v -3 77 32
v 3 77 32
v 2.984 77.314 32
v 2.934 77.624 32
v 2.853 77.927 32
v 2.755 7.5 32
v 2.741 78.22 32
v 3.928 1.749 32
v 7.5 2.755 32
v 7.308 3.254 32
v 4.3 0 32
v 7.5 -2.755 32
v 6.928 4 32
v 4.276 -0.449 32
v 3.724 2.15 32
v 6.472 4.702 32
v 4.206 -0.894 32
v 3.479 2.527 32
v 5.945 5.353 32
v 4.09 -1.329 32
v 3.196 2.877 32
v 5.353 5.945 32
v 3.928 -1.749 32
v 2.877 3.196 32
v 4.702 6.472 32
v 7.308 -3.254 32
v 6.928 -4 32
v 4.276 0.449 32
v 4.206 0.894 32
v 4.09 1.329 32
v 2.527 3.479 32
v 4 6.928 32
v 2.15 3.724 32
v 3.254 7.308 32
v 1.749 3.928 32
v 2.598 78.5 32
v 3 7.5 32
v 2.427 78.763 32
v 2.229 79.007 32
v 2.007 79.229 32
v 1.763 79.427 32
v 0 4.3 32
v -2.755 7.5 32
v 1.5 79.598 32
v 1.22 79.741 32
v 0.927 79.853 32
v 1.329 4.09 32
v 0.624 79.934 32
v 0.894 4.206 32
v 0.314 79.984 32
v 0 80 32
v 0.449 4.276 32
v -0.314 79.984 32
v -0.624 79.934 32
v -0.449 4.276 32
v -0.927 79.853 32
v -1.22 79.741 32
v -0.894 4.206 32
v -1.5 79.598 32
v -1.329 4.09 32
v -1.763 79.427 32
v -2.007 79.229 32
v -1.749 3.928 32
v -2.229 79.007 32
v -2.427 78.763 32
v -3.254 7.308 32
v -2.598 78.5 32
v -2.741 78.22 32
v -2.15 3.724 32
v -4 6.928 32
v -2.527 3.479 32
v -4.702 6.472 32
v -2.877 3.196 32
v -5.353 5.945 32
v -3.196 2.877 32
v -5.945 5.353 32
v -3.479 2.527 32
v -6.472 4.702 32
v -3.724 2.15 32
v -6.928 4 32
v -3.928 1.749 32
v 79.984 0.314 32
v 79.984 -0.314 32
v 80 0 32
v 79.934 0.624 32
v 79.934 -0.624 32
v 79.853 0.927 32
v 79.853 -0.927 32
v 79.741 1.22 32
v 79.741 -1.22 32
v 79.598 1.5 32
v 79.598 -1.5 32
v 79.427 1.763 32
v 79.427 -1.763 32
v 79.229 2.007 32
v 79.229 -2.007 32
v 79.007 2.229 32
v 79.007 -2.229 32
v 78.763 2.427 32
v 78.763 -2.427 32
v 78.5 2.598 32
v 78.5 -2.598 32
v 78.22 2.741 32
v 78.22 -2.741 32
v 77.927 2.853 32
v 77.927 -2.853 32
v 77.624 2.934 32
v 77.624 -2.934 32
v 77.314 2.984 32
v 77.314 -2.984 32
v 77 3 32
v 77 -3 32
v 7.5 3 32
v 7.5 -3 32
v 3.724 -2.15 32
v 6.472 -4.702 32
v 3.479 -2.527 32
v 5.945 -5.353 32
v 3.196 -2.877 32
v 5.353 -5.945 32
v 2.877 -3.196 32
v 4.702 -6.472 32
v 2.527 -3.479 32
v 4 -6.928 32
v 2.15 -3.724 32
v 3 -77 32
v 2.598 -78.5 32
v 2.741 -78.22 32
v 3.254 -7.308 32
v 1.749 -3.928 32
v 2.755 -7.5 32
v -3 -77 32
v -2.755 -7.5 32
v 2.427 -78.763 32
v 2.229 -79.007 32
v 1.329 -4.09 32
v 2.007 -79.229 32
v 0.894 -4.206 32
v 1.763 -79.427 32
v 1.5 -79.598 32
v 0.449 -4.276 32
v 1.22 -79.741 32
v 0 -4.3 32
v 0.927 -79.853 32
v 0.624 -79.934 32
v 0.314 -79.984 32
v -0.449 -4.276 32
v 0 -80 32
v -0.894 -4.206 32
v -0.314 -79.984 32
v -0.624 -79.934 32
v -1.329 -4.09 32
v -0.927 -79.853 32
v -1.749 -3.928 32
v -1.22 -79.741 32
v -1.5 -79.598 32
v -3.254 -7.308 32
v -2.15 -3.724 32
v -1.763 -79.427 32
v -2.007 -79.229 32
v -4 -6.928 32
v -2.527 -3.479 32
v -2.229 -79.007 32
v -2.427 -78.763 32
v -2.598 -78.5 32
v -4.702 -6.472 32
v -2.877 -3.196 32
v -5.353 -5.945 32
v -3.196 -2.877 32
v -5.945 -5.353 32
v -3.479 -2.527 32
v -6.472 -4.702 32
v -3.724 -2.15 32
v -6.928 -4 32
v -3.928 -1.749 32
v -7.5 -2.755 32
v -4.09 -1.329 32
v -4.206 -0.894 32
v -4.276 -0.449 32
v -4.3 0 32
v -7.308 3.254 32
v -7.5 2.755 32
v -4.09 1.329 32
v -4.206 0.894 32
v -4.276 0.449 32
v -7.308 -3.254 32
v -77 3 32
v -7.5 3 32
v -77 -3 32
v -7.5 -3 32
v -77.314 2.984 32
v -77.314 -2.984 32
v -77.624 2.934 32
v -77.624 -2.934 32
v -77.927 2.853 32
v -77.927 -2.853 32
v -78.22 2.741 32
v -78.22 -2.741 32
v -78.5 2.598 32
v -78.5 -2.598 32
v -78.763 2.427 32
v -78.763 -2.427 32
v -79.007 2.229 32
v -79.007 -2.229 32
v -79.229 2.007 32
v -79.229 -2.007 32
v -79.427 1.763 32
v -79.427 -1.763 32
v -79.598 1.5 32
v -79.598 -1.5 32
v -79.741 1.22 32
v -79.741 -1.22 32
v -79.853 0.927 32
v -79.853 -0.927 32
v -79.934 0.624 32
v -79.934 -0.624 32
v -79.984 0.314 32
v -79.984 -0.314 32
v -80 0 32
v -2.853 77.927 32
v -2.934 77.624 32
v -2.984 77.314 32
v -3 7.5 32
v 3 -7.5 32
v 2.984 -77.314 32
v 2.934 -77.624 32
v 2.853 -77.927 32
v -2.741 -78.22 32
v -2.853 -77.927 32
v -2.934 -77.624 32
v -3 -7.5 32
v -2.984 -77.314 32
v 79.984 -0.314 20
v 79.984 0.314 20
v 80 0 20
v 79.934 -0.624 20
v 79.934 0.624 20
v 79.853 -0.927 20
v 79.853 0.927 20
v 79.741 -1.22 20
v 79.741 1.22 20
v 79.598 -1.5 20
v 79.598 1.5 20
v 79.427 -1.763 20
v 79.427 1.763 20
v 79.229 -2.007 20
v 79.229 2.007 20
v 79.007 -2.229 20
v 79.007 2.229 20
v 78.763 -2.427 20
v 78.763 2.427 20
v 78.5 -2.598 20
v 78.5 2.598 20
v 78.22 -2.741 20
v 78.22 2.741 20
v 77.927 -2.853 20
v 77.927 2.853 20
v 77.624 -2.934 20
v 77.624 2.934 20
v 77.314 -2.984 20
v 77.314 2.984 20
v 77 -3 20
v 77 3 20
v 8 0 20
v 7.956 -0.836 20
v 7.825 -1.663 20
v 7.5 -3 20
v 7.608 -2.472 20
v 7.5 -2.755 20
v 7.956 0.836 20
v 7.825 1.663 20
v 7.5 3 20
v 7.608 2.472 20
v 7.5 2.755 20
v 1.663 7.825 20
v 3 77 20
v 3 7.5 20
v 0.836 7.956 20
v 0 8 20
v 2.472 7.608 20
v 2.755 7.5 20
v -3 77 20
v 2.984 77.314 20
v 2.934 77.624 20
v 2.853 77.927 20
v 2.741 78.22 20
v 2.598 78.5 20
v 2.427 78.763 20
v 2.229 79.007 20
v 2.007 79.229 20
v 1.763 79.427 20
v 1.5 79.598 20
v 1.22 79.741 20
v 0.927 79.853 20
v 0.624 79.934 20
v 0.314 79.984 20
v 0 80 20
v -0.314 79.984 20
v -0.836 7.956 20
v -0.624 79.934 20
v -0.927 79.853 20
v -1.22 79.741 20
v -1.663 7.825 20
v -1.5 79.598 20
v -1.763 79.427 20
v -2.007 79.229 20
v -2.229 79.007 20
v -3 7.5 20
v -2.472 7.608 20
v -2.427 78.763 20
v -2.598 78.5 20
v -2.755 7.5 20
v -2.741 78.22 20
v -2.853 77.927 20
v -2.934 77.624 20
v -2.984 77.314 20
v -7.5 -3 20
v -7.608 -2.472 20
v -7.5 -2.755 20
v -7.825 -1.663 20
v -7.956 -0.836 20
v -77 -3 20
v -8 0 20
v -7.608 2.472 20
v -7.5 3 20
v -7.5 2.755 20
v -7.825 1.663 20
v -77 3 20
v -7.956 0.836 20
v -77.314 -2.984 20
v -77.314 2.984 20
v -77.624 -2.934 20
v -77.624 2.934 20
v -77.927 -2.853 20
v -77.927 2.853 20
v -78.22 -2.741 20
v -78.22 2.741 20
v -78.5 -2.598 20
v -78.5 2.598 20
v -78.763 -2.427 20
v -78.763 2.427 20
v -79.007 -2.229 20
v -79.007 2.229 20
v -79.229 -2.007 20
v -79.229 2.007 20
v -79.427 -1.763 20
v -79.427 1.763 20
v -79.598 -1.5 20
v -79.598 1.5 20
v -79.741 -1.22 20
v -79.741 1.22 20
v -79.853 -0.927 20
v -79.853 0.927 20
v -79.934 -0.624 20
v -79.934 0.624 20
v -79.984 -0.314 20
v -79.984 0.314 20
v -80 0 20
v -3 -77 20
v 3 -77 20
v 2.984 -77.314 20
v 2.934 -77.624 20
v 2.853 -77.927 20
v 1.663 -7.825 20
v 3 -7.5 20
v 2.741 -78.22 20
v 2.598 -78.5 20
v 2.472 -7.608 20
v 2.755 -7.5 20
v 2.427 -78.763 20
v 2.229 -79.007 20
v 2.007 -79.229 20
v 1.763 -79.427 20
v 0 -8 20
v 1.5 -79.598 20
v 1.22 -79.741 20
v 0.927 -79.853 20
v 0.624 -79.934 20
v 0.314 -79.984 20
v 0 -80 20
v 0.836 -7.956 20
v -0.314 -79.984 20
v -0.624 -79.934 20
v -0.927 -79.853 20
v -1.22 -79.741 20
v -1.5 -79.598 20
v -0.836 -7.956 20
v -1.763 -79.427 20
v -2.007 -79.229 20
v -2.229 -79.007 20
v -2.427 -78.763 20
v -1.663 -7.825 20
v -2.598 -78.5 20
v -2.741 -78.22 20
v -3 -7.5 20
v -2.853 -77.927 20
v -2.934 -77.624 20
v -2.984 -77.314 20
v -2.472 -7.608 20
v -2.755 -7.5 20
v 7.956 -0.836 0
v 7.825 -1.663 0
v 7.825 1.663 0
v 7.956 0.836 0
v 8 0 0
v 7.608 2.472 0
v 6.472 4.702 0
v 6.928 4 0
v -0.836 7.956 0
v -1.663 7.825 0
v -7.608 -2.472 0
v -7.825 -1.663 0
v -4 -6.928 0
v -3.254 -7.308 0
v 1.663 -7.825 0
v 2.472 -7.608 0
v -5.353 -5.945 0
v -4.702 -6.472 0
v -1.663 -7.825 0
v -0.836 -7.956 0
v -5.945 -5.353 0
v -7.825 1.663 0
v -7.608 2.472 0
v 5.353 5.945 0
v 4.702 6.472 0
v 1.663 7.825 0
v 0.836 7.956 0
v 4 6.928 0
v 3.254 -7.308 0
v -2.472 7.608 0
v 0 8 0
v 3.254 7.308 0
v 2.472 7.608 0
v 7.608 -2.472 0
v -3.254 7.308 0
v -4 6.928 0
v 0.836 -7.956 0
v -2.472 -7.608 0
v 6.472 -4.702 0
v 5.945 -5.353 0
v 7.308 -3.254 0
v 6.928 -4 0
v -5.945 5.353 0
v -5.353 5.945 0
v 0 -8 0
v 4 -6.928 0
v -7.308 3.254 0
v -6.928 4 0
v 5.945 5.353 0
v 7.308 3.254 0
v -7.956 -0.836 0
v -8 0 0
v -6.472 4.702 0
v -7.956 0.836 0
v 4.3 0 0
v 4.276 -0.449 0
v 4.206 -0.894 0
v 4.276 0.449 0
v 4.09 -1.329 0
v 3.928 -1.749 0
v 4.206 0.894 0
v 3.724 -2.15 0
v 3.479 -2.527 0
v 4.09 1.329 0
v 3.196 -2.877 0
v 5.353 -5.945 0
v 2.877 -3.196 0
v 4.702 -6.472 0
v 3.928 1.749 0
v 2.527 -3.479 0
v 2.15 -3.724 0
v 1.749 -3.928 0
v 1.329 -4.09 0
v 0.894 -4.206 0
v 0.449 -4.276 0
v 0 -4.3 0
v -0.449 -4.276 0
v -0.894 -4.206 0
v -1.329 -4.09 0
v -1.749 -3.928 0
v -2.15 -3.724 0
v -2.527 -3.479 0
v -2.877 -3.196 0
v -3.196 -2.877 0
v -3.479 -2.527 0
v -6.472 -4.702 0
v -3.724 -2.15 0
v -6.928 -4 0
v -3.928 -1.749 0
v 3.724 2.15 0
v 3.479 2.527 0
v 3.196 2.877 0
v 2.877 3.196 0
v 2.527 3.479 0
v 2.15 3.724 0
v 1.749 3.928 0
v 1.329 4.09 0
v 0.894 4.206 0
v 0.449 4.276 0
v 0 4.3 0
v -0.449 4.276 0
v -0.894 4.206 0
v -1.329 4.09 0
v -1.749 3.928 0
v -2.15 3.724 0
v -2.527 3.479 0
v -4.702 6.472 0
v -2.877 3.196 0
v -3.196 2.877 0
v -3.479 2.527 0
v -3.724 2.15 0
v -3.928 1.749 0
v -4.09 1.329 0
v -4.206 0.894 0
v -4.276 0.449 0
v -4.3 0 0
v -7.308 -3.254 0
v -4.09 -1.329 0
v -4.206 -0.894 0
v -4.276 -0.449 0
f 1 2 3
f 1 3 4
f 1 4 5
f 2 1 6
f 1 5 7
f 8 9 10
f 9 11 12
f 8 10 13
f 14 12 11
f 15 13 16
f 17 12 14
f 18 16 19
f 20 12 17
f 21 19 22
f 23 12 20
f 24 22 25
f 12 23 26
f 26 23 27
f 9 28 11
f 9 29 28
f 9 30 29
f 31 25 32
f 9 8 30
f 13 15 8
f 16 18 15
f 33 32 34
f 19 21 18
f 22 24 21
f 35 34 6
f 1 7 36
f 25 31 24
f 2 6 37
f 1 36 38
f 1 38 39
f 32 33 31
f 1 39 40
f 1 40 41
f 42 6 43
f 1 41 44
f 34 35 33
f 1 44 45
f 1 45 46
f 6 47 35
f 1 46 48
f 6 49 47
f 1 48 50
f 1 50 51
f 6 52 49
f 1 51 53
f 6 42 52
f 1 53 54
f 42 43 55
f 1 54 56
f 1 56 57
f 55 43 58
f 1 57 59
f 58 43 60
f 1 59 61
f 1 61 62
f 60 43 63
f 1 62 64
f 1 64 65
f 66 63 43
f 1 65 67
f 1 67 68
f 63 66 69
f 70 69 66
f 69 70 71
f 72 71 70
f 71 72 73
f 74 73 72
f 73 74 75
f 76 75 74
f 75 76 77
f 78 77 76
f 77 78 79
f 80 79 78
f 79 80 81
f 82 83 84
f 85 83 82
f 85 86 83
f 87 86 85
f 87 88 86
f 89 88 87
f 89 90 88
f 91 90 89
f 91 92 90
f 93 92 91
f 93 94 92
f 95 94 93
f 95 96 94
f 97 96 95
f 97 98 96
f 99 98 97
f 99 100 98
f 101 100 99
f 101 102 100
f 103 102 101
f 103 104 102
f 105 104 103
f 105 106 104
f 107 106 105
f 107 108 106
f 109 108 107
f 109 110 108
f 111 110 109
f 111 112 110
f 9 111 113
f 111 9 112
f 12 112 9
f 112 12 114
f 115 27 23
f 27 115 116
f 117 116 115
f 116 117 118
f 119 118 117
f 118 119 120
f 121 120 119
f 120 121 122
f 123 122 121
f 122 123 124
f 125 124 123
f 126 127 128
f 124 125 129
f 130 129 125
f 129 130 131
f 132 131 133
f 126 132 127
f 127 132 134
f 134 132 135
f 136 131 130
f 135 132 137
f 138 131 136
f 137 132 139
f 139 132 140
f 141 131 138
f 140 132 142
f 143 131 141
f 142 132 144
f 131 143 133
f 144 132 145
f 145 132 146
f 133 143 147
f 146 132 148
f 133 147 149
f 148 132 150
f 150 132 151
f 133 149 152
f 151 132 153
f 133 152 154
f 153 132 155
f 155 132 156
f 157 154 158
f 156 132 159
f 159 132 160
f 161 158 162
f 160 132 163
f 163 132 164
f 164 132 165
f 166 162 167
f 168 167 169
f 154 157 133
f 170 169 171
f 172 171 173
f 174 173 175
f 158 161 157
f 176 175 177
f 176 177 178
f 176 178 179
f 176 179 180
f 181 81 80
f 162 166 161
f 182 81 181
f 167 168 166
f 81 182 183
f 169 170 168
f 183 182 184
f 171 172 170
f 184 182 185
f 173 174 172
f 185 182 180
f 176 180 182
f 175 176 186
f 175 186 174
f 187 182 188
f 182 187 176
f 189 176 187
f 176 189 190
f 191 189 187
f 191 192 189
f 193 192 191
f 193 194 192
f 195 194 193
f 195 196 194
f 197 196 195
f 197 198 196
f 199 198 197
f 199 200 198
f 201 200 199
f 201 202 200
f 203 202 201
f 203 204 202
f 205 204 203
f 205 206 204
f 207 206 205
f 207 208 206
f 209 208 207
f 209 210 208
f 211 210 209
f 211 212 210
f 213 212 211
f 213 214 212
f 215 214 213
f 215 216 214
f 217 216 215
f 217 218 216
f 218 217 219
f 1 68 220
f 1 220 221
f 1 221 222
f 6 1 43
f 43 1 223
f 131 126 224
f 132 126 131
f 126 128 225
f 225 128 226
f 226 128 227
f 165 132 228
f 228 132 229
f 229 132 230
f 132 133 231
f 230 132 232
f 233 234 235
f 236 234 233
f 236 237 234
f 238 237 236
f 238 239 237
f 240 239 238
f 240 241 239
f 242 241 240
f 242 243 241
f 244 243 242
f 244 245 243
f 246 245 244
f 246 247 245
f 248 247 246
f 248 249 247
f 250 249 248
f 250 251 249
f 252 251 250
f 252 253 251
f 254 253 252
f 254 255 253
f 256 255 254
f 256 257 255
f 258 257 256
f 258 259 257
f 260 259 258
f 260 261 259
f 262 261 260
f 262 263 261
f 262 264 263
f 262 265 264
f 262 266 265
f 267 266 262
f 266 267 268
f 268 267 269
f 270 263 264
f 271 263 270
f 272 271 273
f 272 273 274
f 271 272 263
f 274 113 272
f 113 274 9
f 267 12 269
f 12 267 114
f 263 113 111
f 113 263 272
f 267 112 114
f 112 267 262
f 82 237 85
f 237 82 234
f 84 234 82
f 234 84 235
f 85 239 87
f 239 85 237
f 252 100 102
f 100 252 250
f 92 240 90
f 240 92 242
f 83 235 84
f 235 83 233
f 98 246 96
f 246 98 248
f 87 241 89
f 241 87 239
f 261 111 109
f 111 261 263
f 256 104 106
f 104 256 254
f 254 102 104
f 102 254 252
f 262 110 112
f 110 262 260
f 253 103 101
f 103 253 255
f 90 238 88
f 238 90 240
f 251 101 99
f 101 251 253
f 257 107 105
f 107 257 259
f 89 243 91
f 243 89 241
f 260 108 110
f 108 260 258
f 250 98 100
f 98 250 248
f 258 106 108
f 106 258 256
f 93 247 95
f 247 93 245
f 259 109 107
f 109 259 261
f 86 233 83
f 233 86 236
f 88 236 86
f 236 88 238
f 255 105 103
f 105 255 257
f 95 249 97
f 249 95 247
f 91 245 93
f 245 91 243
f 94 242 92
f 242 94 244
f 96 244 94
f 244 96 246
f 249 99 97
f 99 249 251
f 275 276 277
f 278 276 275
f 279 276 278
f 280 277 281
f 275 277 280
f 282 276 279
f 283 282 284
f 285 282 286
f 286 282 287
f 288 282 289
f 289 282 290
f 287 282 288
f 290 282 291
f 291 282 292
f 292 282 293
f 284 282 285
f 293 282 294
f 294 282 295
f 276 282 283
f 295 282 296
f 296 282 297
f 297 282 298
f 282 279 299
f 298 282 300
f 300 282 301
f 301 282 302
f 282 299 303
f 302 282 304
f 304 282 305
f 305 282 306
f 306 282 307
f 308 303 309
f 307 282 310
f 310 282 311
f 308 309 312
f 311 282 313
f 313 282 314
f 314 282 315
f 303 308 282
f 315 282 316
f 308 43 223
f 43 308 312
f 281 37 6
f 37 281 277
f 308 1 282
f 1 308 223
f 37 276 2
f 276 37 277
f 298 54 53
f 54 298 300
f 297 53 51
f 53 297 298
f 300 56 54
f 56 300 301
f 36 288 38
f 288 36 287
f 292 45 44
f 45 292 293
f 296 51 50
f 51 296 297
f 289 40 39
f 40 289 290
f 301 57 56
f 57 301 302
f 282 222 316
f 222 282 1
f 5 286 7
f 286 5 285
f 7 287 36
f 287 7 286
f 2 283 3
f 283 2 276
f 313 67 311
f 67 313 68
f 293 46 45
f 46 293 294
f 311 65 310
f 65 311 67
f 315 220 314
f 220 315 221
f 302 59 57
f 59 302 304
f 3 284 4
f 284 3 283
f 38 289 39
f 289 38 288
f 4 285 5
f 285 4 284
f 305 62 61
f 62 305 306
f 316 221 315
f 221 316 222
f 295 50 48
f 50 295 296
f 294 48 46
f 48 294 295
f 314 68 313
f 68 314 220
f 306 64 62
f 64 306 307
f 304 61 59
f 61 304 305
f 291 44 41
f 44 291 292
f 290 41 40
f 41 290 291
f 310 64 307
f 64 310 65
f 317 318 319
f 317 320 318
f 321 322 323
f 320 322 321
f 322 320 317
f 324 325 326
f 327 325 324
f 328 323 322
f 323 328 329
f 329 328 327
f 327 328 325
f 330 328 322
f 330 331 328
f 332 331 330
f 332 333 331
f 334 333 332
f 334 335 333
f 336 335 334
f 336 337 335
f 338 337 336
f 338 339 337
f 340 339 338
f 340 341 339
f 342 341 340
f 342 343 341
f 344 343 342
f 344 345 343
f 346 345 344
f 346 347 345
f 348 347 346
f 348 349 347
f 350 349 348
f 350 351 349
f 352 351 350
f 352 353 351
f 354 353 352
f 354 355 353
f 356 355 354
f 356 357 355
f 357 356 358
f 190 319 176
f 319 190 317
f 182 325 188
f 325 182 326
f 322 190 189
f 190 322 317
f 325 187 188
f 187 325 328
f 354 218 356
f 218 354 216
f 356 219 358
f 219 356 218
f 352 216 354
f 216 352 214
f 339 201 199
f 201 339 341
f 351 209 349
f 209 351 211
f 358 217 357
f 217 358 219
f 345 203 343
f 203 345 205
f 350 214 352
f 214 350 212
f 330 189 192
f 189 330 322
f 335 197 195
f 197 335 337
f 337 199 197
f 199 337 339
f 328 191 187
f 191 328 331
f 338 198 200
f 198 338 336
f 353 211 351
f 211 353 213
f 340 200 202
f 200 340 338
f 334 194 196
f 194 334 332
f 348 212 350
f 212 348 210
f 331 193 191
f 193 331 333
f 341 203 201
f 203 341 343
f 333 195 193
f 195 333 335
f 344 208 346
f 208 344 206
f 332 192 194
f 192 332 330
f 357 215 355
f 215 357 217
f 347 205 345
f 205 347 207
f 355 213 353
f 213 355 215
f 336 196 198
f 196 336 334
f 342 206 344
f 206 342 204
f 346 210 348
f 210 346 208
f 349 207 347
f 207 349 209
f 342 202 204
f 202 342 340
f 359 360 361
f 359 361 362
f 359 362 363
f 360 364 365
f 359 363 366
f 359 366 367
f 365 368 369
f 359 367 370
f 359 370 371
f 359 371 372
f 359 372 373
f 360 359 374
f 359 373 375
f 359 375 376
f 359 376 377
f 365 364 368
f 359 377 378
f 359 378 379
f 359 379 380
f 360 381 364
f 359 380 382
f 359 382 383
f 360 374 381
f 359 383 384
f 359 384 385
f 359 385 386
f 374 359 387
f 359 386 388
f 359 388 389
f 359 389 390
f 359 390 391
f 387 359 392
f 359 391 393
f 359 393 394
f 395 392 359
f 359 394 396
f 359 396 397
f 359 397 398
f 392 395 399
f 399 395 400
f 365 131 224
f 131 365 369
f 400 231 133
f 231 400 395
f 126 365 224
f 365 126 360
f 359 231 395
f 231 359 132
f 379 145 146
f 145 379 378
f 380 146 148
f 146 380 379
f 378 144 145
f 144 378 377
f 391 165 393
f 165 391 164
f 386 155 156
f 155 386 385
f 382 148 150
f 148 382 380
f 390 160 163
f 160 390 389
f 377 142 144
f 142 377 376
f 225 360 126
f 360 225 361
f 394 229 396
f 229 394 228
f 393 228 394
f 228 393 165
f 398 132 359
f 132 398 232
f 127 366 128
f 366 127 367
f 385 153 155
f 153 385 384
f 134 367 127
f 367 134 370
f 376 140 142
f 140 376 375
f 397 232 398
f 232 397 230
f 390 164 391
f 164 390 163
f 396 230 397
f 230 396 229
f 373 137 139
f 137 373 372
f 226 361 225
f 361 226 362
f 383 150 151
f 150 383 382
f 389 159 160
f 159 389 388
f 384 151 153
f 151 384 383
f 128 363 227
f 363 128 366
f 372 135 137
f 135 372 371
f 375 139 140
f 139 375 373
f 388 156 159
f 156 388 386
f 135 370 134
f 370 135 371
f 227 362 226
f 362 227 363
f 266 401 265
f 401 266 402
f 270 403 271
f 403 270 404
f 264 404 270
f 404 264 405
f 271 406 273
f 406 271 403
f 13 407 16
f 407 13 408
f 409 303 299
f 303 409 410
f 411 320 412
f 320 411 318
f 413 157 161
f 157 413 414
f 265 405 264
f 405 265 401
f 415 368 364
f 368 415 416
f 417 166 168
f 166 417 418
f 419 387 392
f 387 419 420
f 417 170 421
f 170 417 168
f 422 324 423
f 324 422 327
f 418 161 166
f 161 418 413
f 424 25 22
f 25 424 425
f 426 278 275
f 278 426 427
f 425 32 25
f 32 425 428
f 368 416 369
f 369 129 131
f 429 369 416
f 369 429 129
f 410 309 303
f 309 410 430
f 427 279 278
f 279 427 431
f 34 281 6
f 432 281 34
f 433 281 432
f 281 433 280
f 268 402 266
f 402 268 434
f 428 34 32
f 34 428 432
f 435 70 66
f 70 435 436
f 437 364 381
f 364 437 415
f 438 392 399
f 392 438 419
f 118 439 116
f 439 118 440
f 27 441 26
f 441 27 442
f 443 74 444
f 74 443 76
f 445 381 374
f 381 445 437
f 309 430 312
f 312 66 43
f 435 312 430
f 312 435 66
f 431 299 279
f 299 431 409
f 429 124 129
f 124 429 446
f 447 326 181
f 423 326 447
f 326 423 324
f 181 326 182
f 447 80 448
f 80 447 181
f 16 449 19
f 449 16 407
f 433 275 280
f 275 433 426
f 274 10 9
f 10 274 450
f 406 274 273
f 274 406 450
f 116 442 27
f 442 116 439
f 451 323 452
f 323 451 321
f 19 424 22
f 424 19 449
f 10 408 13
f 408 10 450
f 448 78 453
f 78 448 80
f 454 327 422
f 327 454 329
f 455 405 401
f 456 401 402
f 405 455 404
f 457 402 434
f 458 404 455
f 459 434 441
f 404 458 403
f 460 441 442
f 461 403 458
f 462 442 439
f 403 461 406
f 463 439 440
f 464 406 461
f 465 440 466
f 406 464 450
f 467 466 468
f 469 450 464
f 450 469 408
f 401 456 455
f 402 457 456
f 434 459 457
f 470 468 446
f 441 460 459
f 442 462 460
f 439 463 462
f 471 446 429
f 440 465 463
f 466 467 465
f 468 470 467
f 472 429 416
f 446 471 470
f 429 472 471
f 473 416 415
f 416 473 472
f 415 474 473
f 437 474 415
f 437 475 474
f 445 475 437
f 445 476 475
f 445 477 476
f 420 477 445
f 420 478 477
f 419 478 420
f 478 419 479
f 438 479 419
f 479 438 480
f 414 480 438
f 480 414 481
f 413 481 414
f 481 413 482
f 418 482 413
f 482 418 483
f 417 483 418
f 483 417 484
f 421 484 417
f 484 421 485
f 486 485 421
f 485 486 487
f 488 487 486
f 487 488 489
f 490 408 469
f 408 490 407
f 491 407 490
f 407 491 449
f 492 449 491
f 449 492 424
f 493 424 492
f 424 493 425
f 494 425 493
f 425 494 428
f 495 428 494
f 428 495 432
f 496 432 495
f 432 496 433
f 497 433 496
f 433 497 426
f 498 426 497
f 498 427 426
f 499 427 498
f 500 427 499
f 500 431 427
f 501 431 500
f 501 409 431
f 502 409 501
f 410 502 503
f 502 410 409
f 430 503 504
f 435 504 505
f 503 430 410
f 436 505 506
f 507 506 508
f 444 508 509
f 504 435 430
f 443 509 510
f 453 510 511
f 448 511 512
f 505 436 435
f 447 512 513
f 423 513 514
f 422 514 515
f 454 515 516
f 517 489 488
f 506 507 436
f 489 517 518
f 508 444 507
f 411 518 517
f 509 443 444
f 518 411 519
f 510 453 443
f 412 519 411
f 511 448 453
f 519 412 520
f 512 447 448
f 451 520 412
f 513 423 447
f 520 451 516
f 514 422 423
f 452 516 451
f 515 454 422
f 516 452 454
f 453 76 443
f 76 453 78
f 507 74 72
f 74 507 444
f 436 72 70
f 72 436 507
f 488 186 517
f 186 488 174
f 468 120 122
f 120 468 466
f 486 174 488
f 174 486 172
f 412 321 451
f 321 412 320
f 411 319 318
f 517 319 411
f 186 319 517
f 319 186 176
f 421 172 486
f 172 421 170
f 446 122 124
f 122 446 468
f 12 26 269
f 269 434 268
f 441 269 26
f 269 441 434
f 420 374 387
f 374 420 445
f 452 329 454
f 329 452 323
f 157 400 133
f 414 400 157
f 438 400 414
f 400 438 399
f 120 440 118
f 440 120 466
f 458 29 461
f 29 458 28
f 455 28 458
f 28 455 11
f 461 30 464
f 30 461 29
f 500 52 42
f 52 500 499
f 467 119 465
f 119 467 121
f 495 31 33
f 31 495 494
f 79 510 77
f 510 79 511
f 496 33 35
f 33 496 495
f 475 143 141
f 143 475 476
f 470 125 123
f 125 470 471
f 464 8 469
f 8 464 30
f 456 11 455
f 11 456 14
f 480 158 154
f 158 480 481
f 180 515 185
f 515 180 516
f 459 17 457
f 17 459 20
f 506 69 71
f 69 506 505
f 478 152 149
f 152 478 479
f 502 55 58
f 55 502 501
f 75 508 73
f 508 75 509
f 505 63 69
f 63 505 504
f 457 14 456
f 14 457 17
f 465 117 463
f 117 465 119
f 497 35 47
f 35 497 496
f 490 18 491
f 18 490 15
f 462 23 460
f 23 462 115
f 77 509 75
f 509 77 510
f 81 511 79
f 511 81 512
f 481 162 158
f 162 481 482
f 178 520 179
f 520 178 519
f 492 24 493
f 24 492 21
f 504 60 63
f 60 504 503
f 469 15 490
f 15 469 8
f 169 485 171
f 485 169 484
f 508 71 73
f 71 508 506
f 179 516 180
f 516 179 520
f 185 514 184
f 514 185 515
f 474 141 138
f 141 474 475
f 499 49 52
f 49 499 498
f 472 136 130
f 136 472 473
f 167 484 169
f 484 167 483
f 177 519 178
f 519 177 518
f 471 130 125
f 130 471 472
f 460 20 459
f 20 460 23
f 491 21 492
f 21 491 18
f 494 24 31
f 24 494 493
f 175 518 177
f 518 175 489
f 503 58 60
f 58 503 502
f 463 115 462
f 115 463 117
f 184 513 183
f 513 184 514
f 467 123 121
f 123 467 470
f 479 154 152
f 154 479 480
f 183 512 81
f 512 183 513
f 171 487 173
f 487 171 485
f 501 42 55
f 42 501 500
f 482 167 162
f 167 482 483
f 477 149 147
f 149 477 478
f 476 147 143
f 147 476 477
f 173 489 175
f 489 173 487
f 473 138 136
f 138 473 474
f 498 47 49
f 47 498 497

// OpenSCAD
// Modular Wind-Up Mini Golf System
// PART 2: Obstacles & Accessories

/* [Core Tolerances] */
tile_thickness = 8;
peg_diameter = 5.5;

$fn = 60;

// ==========================================
// RENDER SELECTION
// Uncomment the piece you want to export
// ==========================================

// --- OBSTACLES (Moving Hazards) ---
// turnstile_base();
turnstile_rotor(); // TIP: Print this upside-down in your slicer!

// --- OBSTACLES (Directional Plug-in Holes) ---
// plug_hole_1_ramp();       
// plug_hole_2_ramp_thru();  
// plug_hole_2_ramp_turn();  
// plug_hole_3_ramp();       
// plug_hole_4_ramp();       

// --- ACCESSORIES ---
// connector_peg();          

// ==========================================
// TURNSTILE MODULES
// ==========================================

module turnstile_base() {
  base_length = 70;
  base_width = 20;
  base_height = 10;
  corner_radius = 4; // Rounding radius for the base corners
  axle_diameter = 8;
  axle_height = 30;
  c_hole = 0.2;

  difference() {
    union() {
      // Rounded base plate using hull of cylinders at corners
      translate([0, 0, base_height / 2])
        hull() {
          for (x = [-(base_length / 2 - corner_radius), base_length / 2 - corner_radius]) {
            for (y = [-(base_width / 2 - corner_radius), base_width / 2 - corner_radius]) {
              translate([x, y, 0])
                cylinder(h=base_height, r=corner_radius, center=true);
            }
          }
        }
      translate([0, 0, base_height])
        cylinder(h=axle_height, d=axle_diameter);
      translate([0, 0, base_height])
        cylinder(h=2, d1=axle_diameter + 6, d2=axle_diameter);
    }

    for (x = [-25, 25]) {
      translate([x, 0, -0.1])
        cylinder(h=8.1, d=peg_diameter + c_hole);
    }
  }
}

module turnstile_rotor() {
  clearance = 0.6;
  hub_d = 16;
  hub_h = 32;
  arm_length = 80;
  arm_thickness = 6;
  arm_height = 12;

  difference() {
    union() {
      cylinder(h=hub_h, d=hub_d);
      translate([0, 0, hub_h - arm_height]) {
        for (r = [0, 90, 180, 270]) {
          rotate([0, 0, r]) {
            // Main arm body (shortened by arm_thickness/2 to accommodate rounded tip)
            translate([hub_d / 2 - 0.5, -arm_thickness / 2, 0])
              cube([arm_length - hub_d / 2 + 0.5 - arm_thickness / 2, arm_thickness, arm_height]);
            // Rounded tip
            translate([arm_length - arm_thickness / 2, 0, 0])
              cylinder(h=arm_height, d=arm_thickness);
          }
        }
      }
    }
    translate([0, 0, -1])
      cylinder(h=hub_h + 2, d=8 + clearance);
  }
}

// ==========================================
// TARGET HOLE MODULES
// ==========================================

module plug_hole_1_ramp() { build_directional_hole([1, 0, 0, 0]); }
module plug_hole_2_ramp_thru() { build_directional_hole([1, 0, 1, 0]); }
module plug_hole_2_ramp_turn() { build_directional_hole([1, 1, 0, 0]); }
module plug_hole_3_ramp() { build_directional_hole([1, 1, 0, 1]); }
module plug_hole_4_ramp() { build_directional_hole([1, 1, 1, 1]); }

module build_directional_hole(ramps) {
  height = 10;
  hole_diameter = 85;
  c_hole = 0.2;

  core_size = 115;
  t_front = -core_size / 2;
  t_right = core_size / 2;
  t_back = core_size / 2;
  t_left = -core_size / 2;

  ramp_run = 35;
  b_front = ramps[0] ? t_front - ramp_run : t_front;
  b_right = ramps[1] ? t_right + ramp_run : t_right;
  b_back = ramps[2] ? t_back + ramp_run : t_back;
  b_left = ramps[3] ? t_left - ramp_run : t_left;

  difference() {
    hull() {
      translate([0, 0, 0.1])
        linear_extrude(0.2, center=true)
          polygon(
            [
              [b_left, b_front],
              [b_right, b_front],
              [b_right, b_back],
              [b_left, b_back],
            ]
          );
      translate([0, 0, height - 0.1])
        linear_extrude(0.2, center=true)
          polygon(
            [
              [t_left, t_front],
              [t_right, t_front],
              [t_right, t_back],
              [t_left, t_back],
            ]
          );
    }

    translate([0, 0, -1])
      cylinder(h=height + 2, d=hole_diameter);

    peg_spread = 50;
    steps = [-peg_spread, 0, peg_spread];
    for (x = steps) {
      for (y = steps) {
        if (x != 0 || y != 0) {
          translate([x, y, -0.1])
            cylinder(h=8.1, d=peg_diameter + c_hole);
        }
      }
    }
  }
}

// ==========================================
// ACCESSORY MODULES
// ==========================================

module connector_peg() {
  c = 0.15;
  d = peg_diameter - c;
  h = 15;
  chamf = 1;

  union() {
    translate([0, 0, chamf])
      cylinder(h=h - 2 * chamf, d=d);
    cylinder(h=chamf, d1=d - 2 * chamf, d2=d);
    translate([0, 0, h - chamf])
      cylinder(h=chamf, d1=d, d2=d - 2 * chamf);
  }
}
